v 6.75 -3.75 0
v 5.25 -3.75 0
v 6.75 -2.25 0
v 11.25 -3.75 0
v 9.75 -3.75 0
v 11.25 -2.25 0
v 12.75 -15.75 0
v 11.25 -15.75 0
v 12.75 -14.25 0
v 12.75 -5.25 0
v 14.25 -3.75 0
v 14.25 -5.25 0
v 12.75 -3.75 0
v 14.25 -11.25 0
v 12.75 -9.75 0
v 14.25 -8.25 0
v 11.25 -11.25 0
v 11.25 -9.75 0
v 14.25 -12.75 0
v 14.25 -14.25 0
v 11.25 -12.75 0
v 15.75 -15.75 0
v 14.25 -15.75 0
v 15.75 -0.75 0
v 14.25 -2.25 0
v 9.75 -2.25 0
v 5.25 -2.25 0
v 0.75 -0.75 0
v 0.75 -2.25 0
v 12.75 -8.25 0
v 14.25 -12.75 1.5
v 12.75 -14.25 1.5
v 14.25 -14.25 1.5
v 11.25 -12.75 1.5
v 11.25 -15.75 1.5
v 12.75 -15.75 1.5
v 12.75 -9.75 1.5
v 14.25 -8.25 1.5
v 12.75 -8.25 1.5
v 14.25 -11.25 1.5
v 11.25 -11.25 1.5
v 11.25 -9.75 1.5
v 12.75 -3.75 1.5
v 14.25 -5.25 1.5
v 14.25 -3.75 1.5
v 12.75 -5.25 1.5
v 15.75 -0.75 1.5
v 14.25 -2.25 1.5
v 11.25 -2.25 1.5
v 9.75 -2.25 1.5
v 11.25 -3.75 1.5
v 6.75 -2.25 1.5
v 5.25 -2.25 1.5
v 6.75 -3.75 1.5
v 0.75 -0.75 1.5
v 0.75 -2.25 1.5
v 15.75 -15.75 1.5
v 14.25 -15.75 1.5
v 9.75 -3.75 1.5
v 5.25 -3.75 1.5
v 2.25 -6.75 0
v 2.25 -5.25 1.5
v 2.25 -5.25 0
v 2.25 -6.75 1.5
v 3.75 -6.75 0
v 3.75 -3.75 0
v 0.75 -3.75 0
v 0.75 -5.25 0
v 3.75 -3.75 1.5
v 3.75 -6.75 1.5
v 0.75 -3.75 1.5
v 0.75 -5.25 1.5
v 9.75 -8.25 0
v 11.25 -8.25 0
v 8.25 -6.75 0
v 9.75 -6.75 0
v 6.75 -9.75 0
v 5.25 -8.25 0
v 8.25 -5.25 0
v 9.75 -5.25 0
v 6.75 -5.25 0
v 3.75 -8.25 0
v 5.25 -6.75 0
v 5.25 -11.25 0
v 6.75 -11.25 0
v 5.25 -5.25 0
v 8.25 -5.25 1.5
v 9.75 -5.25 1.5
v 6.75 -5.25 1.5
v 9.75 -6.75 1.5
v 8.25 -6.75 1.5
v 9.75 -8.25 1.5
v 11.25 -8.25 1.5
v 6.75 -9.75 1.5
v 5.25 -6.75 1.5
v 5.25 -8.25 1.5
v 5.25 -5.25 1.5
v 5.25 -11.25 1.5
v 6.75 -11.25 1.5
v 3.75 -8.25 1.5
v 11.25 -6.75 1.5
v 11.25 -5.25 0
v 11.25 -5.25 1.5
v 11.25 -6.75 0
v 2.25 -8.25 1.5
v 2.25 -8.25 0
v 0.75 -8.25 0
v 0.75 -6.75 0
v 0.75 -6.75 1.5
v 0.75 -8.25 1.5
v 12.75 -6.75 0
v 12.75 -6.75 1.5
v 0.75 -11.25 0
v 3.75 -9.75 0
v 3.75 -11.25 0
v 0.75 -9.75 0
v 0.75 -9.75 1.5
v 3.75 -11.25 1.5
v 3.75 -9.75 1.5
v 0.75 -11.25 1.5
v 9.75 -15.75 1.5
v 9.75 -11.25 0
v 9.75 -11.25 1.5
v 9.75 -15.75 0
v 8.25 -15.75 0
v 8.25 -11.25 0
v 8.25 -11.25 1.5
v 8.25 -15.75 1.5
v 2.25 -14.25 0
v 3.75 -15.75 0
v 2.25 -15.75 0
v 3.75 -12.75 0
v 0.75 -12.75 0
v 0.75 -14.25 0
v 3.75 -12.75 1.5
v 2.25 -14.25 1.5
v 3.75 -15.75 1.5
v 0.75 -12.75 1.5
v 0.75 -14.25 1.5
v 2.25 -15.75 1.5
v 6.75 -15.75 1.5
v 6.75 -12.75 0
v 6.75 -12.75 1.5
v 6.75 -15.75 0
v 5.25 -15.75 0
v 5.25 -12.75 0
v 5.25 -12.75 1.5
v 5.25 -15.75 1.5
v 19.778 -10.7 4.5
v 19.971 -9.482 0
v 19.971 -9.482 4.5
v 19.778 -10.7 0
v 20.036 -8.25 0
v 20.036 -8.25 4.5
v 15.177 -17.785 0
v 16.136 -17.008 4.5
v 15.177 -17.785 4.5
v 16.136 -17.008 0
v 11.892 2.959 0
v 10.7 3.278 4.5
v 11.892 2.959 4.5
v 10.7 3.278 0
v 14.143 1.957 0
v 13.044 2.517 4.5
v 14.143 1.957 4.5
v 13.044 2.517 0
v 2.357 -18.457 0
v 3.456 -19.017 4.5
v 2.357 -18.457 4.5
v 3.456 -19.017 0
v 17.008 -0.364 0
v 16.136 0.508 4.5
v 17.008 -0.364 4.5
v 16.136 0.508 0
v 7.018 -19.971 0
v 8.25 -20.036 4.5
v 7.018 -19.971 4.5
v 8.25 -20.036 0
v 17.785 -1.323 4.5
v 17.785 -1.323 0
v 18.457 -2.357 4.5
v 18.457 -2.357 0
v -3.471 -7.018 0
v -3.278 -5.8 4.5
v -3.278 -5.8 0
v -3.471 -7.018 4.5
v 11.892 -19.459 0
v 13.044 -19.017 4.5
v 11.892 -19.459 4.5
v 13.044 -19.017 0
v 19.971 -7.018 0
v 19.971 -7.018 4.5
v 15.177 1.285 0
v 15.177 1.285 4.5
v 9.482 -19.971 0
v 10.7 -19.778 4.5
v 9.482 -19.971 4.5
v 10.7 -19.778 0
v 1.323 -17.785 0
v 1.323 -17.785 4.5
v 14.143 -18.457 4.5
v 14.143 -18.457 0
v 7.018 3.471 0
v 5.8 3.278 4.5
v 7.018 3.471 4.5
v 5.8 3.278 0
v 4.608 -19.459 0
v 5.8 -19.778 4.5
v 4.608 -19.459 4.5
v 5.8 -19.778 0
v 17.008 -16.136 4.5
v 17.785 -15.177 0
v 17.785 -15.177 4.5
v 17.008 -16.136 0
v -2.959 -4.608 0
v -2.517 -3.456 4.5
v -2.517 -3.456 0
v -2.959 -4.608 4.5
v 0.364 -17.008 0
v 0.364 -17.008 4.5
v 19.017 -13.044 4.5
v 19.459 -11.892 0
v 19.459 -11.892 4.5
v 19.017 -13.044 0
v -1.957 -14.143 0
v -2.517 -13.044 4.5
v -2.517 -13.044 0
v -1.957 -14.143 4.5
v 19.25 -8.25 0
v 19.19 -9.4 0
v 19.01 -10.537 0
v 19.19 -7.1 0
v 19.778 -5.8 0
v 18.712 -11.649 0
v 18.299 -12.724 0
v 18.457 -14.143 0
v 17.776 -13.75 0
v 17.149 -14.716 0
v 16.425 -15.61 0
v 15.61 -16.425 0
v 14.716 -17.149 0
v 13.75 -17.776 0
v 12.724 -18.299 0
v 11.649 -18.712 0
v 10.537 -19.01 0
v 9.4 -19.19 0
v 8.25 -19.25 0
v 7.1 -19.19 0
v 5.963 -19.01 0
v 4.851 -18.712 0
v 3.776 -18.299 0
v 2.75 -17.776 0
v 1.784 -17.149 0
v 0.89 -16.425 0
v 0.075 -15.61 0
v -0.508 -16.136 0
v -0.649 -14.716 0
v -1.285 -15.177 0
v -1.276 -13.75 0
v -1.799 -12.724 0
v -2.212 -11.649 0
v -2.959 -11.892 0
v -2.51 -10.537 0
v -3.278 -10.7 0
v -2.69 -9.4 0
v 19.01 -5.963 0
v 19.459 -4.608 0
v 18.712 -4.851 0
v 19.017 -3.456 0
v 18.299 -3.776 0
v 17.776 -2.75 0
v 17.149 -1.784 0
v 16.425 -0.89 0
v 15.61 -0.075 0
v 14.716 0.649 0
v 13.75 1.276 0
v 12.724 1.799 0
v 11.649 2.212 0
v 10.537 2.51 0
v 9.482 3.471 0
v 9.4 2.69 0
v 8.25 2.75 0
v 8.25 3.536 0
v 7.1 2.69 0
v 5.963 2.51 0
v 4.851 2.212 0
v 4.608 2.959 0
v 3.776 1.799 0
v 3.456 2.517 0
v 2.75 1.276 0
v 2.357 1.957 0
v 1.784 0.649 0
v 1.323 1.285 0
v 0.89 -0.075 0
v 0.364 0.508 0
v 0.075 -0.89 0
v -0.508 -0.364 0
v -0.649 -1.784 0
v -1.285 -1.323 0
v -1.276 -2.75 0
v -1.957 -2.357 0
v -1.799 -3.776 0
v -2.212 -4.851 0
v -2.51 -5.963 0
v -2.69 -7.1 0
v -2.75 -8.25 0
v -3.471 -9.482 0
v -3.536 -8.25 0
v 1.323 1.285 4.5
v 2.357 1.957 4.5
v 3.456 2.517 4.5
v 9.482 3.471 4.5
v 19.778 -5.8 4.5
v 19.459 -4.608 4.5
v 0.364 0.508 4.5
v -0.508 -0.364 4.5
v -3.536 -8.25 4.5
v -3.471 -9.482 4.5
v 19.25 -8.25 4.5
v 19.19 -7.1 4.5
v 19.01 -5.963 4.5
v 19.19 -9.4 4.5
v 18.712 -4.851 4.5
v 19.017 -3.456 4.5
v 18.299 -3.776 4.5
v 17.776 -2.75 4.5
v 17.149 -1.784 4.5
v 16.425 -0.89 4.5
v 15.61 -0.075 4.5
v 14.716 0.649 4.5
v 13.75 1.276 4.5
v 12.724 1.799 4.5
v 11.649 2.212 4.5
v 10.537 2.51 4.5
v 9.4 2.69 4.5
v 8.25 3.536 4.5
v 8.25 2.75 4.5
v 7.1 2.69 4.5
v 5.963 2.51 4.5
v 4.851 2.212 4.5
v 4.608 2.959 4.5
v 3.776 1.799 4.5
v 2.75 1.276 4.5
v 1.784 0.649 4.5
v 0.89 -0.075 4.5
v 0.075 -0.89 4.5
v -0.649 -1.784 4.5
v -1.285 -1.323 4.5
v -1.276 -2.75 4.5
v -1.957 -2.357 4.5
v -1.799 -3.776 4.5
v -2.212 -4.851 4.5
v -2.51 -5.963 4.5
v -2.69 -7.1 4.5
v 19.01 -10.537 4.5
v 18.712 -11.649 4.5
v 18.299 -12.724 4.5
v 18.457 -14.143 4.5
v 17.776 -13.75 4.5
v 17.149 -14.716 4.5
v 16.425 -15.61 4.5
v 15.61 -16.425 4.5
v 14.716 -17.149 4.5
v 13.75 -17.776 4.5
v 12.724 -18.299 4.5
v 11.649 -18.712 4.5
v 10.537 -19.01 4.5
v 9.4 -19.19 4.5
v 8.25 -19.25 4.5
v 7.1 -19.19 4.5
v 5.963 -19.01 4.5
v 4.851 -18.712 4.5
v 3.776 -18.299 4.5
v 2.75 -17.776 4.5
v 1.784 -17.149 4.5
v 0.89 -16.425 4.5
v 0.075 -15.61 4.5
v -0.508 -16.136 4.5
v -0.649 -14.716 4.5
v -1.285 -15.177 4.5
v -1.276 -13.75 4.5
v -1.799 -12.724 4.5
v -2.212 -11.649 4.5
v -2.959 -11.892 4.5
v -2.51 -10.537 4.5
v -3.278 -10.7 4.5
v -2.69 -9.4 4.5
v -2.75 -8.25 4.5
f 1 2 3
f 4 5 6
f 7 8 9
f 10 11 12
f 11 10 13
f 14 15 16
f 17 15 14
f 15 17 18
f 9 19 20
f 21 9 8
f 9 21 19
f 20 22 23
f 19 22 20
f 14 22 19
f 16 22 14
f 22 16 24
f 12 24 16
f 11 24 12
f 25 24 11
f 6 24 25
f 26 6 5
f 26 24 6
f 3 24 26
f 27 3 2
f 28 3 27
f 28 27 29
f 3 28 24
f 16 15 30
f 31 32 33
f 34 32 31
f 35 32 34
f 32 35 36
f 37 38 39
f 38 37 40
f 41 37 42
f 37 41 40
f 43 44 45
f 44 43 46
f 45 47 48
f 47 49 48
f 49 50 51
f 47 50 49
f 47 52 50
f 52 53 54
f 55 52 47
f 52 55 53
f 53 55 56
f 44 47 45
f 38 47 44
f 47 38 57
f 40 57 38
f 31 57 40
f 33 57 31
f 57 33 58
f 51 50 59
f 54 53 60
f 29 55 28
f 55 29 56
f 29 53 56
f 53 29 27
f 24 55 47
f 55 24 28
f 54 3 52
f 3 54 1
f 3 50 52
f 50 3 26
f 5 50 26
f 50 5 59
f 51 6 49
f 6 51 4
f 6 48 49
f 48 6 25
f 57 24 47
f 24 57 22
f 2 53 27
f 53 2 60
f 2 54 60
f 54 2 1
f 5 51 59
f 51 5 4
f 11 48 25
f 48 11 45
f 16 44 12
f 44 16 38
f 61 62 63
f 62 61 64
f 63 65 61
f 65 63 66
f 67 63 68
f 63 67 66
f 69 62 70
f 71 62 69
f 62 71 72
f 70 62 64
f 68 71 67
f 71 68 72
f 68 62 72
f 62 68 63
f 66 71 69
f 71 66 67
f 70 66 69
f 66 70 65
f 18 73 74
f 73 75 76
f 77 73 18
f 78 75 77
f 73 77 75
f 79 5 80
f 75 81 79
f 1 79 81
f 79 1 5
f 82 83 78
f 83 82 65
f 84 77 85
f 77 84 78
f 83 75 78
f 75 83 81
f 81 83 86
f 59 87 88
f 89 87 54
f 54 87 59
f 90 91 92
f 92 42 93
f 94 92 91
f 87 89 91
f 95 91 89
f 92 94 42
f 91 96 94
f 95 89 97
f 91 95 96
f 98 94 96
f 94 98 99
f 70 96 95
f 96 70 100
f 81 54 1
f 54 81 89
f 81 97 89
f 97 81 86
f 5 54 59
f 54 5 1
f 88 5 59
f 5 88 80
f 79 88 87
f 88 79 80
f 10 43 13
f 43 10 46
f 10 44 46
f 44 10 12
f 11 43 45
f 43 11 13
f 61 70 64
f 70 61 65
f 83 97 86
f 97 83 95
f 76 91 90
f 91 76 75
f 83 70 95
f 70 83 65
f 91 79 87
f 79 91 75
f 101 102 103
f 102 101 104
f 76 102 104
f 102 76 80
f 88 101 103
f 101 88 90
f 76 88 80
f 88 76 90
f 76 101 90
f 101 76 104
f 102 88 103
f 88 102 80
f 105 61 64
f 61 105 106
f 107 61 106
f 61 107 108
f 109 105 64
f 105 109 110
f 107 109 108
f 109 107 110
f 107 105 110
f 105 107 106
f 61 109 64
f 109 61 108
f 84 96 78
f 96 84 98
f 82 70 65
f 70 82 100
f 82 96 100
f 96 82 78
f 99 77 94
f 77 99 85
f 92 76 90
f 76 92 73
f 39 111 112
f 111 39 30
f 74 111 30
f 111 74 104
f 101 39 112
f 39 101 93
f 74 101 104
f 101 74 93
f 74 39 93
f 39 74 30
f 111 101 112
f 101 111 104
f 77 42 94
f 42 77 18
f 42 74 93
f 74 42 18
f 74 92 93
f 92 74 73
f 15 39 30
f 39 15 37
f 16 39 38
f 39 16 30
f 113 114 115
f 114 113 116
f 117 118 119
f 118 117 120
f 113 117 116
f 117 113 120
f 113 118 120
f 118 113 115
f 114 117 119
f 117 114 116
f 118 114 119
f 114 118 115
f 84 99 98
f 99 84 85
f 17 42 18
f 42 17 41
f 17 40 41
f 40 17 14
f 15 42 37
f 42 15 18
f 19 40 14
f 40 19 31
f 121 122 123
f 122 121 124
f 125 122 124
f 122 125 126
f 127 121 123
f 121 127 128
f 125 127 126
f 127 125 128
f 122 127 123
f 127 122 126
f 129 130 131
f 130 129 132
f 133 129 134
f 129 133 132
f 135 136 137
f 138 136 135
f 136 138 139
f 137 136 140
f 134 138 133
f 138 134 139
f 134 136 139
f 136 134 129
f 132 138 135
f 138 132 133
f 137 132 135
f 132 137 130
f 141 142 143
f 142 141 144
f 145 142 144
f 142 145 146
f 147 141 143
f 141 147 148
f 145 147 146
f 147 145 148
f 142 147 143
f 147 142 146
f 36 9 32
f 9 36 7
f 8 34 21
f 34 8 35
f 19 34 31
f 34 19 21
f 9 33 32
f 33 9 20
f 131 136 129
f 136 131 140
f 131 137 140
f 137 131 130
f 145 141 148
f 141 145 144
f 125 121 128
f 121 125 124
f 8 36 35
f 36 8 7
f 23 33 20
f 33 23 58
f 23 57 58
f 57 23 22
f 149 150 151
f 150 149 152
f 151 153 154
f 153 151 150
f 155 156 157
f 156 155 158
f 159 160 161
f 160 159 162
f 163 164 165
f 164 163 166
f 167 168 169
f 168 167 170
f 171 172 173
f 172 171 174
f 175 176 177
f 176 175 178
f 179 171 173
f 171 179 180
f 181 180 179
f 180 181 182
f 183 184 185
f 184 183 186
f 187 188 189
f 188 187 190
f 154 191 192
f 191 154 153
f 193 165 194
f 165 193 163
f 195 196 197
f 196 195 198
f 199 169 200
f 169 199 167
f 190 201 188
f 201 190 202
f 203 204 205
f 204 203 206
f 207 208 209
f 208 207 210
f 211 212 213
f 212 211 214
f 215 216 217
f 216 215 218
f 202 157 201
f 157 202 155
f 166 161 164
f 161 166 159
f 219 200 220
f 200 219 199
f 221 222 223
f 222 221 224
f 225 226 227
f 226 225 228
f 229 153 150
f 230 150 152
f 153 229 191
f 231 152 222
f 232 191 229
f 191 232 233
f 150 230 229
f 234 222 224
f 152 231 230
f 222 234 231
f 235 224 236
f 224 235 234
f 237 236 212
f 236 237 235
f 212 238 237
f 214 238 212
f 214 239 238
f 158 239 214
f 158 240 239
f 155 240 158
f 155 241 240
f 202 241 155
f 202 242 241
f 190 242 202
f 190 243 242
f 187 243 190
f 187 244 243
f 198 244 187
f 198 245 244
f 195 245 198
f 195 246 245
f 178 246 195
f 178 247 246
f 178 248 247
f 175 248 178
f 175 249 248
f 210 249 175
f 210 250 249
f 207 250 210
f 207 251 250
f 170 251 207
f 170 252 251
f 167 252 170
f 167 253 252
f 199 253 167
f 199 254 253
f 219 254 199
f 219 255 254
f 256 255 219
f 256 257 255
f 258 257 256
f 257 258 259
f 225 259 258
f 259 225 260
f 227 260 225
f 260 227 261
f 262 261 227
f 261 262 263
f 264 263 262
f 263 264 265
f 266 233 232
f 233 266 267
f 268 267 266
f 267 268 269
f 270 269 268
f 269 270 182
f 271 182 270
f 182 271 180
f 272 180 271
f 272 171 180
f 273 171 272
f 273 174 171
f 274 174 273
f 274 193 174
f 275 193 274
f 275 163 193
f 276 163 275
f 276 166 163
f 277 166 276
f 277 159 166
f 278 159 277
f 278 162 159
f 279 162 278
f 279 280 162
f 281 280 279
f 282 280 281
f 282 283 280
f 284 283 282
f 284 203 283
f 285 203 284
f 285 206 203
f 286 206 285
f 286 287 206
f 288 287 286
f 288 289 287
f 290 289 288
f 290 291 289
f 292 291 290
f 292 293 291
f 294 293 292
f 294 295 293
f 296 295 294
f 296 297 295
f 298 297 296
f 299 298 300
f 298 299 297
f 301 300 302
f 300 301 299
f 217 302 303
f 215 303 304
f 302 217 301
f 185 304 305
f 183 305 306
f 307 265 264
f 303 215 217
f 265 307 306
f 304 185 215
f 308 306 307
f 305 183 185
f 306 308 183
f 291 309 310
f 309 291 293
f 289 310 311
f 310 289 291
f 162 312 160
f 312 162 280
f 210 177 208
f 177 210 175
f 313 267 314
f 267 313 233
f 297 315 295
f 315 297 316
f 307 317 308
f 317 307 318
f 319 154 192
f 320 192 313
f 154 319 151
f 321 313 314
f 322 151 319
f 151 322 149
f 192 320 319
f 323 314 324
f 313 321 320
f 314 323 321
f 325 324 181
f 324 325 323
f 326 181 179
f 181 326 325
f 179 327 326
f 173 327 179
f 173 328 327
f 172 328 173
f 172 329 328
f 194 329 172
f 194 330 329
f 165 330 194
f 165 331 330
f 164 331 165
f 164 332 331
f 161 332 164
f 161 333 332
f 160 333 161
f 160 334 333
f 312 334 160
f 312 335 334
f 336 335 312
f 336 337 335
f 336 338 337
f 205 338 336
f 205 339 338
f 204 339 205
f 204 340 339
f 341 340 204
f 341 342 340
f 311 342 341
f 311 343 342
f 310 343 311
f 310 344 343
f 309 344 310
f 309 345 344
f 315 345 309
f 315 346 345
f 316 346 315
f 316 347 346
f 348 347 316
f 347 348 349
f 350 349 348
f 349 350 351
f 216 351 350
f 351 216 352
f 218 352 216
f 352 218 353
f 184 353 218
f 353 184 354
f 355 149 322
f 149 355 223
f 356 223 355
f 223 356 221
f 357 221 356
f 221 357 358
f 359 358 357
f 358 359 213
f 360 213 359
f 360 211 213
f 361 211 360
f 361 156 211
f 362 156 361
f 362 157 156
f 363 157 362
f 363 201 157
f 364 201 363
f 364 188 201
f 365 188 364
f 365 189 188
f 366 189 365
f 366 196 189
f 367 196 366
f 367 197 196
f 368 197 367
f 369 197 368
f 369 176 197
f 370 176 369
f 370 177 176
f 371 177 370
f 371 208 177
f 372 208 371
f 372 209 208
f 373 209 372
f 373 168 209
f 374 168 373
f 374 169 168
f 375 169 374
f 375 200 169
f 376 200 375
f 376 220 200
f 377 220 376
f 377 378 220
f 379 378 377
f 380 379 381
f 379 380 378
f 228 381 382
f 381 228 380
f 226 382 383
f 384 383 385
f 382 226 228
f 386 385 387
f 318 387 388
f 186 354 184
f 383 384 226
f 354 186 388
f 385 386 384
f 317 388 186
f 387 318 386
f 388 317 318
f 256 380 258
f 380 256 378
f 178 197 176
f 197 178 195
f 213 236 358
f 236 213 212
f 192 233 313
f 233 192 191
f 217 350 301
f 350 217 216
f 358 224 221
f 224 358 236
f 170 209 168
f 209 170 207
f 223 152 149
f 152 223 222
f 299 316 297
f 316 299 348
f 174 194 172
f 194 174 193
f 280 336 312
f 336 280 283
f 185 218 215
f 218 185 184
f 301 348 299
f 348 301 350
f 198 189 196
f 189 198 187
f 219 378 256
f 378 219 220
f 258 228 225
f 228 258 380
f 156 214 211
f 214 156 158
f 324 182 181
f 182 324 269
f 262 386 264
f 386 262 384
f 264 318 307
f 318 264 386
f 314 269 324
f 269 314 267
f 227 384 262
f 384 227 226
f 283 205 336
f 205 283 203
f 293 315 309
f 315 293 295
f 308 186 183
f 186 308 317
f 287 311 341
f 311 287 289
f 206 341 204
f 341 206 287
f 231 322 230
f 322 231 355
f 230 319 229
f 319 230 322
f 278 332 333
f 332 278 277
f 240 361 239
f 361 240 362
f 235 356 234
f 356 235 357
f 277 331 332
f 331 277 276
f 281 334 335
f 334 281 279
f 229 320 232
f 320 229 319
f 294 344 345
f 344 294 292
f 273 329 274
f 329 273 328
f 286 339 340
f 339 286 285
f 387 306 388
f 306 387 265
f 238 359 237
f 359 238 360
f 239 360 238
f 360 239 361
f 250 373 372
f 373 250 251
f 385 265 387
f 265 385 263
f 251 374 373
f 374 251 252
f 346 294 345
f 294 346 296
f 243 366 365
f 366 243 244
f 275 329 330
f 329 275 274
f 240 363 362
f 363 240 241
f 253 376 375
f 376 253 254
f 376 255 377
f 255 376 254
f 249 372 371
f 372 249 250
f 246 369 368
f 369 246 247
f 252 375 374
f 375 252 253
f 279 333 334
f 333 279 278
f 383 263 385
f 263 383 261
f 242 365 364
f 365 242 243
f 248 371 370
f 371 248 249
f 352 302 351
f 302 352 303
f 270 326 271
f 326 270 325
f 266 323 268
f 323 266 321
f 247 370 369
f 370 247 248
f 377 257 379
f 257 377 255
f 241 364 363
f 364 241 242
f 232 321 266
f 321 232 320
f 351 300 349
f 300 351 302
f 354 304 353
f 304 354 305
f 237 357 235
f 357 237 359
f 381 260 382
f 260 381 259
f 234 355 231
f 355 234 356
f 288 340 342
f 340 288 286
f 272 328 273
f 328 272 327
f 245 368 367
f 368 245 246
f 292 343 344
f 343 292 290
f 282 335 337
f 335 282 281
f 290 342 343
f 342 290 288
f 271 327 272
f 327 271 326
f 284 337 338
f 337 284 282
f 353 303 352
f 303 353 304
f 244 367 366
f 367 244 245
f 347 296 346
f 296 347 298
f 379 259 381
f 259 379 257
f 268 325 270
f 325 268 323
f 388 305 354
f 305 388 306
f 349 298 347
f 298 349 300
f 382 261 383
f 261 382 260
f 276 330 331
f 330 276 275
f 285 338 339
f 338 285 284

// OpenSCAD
rotate([180,0,0])translate([0,0,-0.75]){
translate([1.5,1.5,0])  cube(size = [1.5,1.5,1.5], center=true);
translate([3,1.5,0])  cube(size = [1.5,1.5,1.5], center=true);
translate([4.5,1.5,0])  cube(size = [1.5,1.5,1.5], center=true);
translate([6,1.5,0])  cube(size = [1.5,1.5,1.5], center=true);
translate([7.5,1.5,0])  cube(size = [1.5,1.5,1.5], center=true);
translate([9,1.5,0])  cube(size = [1.5,1.5,1.5], center=true);
translate([10.5,1.5,0])  cube(size = [1.5,1.5,1.5], center=true);
translate([12,1.5,0])  cube(size = [1.5,1.5,1.5], center=true);
translate([13.5,1.5,0])  cube(size = [1.5,1.5,1.5], center=true);
translate([15,1.5,0])  cube(size = [1.5,1.5,1.5], center=true);
translate([15,1.5,0])  cube(size = [1.5,1.5,1.5], center=true);
translate([15,1.5,0])  cube(size = [1.5,1.5,1.5], center=true);
translate([15,1.5,0])  cube(size = [1.5,1.5,1.5], center=true);
translate([6,3,0])  cube(size = [1.5,1.5,1.5], center=true);
translate([6,3,0])  cube(size = [1.5,1.5,1.5], center=true);
translate([6,3,0])  cube(size = [1.5,1.5,1.5], center=true);
translate([10.5,3,0])  cube(size = [1.5,1.5,1.5], center=true);
translate([10.5,3,0])  cube(size = [1.5,1.5,1.5], center=true);
translate([10.5,3,0])  cube(size = [1.5,1.5,1.5], center=true);
translate([15,3,0])  cube(size = [1.5,1.5,1.5], center=true);
translate([1.5,4.5,0])  cube(size = [1.5,1.5,1.5], center=true);
translate([3,4.5,0])  cube(size = [1.5,1.5,1.5], center=true);
translate([3,4.5,0])  cube(size = [1.5,1.5,1.5], center=true);
translate([3,4.5,0])  cube(size = [1.5,1.5,1.5], center=true);
translate([7.5,4.5,0])  cube(size = [1.5,1.5,1.5], center=true);
translate([9,4.5,0])  cube(size = [1.5,1.5,1.5], center=true);
translate([9,4.5,0])  cube(size = [1.5,1.5,1.5], center=true);
translate([9,4.5,0])  cube(size = [1.5,1.5,1.5], center=true);
translate([13.5,4.5,0])  cube(size = [1.5,1.5,1.5], center=true);
translate([15,4.5,0])  cube(size = [1.5,1.5,1.5], center=true);
translate([15,4.5,0])  cube(size = [1.5,1.5,1.5], center=true);
translate([3,6,0])  cube(size = [1.5,1.5,1.5], center=true);
translate([3,6,0])  cube(size = [1.5,1.5,1.5], center=true);
translate([6,6,0])  cube(size = [1.5,1.5,1.5], center=true);
translate([7.5,6,0])  cube(size = [1.5,1.5,1.5], center=true);
translate([7.5,6,0])  cube(size = [1.5,1.5,1.5], center=true);
translate([10.5,6,0])  cube(size = [1.5,1.5,1.5], center=true);
translate([10.5,6,0])  cube(size = [1.5,1.5,1.5], center=true);
translate([10.5,6,0])  cube(size = [1.5,1.5,1.5], center=true);
translate([15,6,0])  cube(size = [1.5,1.5,1.5], center=true);
translate([1.5,7.5,0])  cube(size = [1.5,1.5,1.5], center=true);
translate([1.5,7.5,0])  cube(size = [1.5,1.5,1.5], center=true);
translate([4.5,7.5,0])  cube(size = [1.5,1.5,1.5], center=true);
translate([6,7.5,0])  cube(size = [1.5,1.5,1.5], center=true);
translate([7.5,7.5,0])  cube(size = [1.5,1.5,1.5], center=true);
translate([9,7.5,0])  cube(size = [1.5,1.5,1.5], center=true);
translate([9,7.5,0])  cube(size = [1.5,1.5,1.5], center=true);
translate([12,7.5,0])  cube(size = [1.5,1.5,1.5], center=true);
translate([12,7.5,0])  cube(size = [1.5,1.5,1.5], center=true);
translate([15,7.5,0])  cube(size = [1.5,1.5,1.5], center=true);
translate([15,7.5,0])  cube(size = [1.5,1.5,1.5], center=true);
translate([15,7.5,0])  cube(size = [1.5,1.5,1.5], center=true);
translate([15,7.5,0])  cube(size = [1.5,1.5,1.5], center=true);
translate([6,9,0])  cube(size = [1.5,1.5,1.5], center=true);
translate([7.5,9,0])  cube(size = [1.5,1.5,1.5], center=true);
translate([9,9,0])  cube(size = [1.5,1.5,1.5], center=true);
translate([10.5,9,0])  cube(size = [1.5,1.5,1.5], center=true);
translate([10.5,9,0])  cube(size = [1.5,1.5,1.5], center=true);
translate([13.5,9,0])  cube(size = [1.5,1.5,1.5], center=true);
translate([15,9,0])  cube(size = [1.5,1.5,1.5], center=true);
translate([1.5,10.5,0])  cube(size = [1.5,1.5,1.5], center=true);
translate([3,10.5,0])  cube(size = [1.5,1.5,1.5], center=true);
translate([3,10.5,0])  cube(size = [1.5,1.5,1.5], center=true);
translate([6,10.5,0])  cube(size = [1.5,1.5,1.5], center=true);
translate([6,10.5,0])  cube(size = [1.5,1.5,1.5], center=true);
translate([6,10.5,0])  cube(size = [1.5,1.5,1.5], center=true);
translate([6,10.5,0])  cube(size = [1.5,1.5,1.5], center=true);
translate([12,10.5,0])  cube(size = [1.5,1.5,1.5], center=true);
translate([13.5,10.5,0])  cube(size = [1.5,1.5,1.5], center=true);
translate([15,10.5,0])  cube(size = [1.5,1.5,1.5], center=true);
translate([15,10.5,0])  cube(size = [1.5,1.5,1.5], center=true);
translate([15,10.5,0])  cube(size = [1.5,1.5,1.5], center=true);
translate([15,10.5,0])  cube(size = [1.5,1.5,1.5], center=true);
translate([15,10.5,0])  cube(size = [1.5,1.5,1.5], center=true);
translate([15,10.5,0])  cube(size = [1.5,1.5,1.5], center=true);
translate([9,12,0])  cube(size = [1.5,1.5,1.5], center=true);
translate([9,12,0])  cube(size = [1.5,1.5,1.5], center=true);
translate([9,12,0])  cube(size = [1.5,1.5,1.5], center=true);
translate([9,12,0])  cube(size = [1.5,1.5,1.5], center=true);
translate([15,12,0])  cube(size = [1.5,1.5,1.5], center=true);
translate([1.5,13.5,0])  cube(size = [1.5,1.5,1.5], center=true);
translate([3,13.5,0])  cube(size = [1.5,1.5,1.5], center=true);
translate([3,13.5,0])  cube(size = [1.5,1.5,1.5], center=true);
translate([6,13.5,0])  cube(size = [1.5,1.5,1.5], center=true);
translate([6,13.5,0])  cube(size = [1.5,1.5,1.5], center=true);
translate([9,13.5,0])  cube(size = [1.5,1.5,1.5], center=true);
translate([9,13.5,0])  cube(size = [1.5,1.5,1.5], center=true);
translate([12,13.5,0])  cube(size = [1.5,1.5,1.5], center=true);
translate([13.5,13.5,0])  cube(size = [1.5,1.5,1.5], center=true);
translate([15,13.5,0])  cube(size = [1.5,1.5,1.5], center=true);
translate([15,13.5,0])  cube(size = [1.5,1.5,1.5], center=true);
translate([3,15,0])  cube(size = [1.5,1.5,1.5], center=true);
translate([3,15,0])  cube(size = [1.5,1.5,1.5], center=true);
translate([6,15,0])  cube(size = [1.5,1.5,1.5], center=true);
translate([6,15,0])  cube(size = [1.5,1.5,1.5], center=true);
translate([9,15,0])  cube(size = [1.5,1.5,1.5], center=true);
translate([9,15,0])  cube(size = [1.5,1.5,1.5], center=true);
translate([12,15,0])  cube(size = [1.5,1.5,1.5], center=true);
translate([12,15,0])  cube(size = [1.5,1.5,1.5], center=true);
translate([15,15,0])  cube(size = [1.5,1.5,1.5], center=true);
}
rotate([180,0,0])difference(){translate([8.25,8.25,-2.25])  cylinder(r=11.7857142857143,h=4.5,$fn=60, center=true);
translate([8.25,8.25,-2.25])  cylinder(r=11,h=4.5,$fn=60, center=true);}
